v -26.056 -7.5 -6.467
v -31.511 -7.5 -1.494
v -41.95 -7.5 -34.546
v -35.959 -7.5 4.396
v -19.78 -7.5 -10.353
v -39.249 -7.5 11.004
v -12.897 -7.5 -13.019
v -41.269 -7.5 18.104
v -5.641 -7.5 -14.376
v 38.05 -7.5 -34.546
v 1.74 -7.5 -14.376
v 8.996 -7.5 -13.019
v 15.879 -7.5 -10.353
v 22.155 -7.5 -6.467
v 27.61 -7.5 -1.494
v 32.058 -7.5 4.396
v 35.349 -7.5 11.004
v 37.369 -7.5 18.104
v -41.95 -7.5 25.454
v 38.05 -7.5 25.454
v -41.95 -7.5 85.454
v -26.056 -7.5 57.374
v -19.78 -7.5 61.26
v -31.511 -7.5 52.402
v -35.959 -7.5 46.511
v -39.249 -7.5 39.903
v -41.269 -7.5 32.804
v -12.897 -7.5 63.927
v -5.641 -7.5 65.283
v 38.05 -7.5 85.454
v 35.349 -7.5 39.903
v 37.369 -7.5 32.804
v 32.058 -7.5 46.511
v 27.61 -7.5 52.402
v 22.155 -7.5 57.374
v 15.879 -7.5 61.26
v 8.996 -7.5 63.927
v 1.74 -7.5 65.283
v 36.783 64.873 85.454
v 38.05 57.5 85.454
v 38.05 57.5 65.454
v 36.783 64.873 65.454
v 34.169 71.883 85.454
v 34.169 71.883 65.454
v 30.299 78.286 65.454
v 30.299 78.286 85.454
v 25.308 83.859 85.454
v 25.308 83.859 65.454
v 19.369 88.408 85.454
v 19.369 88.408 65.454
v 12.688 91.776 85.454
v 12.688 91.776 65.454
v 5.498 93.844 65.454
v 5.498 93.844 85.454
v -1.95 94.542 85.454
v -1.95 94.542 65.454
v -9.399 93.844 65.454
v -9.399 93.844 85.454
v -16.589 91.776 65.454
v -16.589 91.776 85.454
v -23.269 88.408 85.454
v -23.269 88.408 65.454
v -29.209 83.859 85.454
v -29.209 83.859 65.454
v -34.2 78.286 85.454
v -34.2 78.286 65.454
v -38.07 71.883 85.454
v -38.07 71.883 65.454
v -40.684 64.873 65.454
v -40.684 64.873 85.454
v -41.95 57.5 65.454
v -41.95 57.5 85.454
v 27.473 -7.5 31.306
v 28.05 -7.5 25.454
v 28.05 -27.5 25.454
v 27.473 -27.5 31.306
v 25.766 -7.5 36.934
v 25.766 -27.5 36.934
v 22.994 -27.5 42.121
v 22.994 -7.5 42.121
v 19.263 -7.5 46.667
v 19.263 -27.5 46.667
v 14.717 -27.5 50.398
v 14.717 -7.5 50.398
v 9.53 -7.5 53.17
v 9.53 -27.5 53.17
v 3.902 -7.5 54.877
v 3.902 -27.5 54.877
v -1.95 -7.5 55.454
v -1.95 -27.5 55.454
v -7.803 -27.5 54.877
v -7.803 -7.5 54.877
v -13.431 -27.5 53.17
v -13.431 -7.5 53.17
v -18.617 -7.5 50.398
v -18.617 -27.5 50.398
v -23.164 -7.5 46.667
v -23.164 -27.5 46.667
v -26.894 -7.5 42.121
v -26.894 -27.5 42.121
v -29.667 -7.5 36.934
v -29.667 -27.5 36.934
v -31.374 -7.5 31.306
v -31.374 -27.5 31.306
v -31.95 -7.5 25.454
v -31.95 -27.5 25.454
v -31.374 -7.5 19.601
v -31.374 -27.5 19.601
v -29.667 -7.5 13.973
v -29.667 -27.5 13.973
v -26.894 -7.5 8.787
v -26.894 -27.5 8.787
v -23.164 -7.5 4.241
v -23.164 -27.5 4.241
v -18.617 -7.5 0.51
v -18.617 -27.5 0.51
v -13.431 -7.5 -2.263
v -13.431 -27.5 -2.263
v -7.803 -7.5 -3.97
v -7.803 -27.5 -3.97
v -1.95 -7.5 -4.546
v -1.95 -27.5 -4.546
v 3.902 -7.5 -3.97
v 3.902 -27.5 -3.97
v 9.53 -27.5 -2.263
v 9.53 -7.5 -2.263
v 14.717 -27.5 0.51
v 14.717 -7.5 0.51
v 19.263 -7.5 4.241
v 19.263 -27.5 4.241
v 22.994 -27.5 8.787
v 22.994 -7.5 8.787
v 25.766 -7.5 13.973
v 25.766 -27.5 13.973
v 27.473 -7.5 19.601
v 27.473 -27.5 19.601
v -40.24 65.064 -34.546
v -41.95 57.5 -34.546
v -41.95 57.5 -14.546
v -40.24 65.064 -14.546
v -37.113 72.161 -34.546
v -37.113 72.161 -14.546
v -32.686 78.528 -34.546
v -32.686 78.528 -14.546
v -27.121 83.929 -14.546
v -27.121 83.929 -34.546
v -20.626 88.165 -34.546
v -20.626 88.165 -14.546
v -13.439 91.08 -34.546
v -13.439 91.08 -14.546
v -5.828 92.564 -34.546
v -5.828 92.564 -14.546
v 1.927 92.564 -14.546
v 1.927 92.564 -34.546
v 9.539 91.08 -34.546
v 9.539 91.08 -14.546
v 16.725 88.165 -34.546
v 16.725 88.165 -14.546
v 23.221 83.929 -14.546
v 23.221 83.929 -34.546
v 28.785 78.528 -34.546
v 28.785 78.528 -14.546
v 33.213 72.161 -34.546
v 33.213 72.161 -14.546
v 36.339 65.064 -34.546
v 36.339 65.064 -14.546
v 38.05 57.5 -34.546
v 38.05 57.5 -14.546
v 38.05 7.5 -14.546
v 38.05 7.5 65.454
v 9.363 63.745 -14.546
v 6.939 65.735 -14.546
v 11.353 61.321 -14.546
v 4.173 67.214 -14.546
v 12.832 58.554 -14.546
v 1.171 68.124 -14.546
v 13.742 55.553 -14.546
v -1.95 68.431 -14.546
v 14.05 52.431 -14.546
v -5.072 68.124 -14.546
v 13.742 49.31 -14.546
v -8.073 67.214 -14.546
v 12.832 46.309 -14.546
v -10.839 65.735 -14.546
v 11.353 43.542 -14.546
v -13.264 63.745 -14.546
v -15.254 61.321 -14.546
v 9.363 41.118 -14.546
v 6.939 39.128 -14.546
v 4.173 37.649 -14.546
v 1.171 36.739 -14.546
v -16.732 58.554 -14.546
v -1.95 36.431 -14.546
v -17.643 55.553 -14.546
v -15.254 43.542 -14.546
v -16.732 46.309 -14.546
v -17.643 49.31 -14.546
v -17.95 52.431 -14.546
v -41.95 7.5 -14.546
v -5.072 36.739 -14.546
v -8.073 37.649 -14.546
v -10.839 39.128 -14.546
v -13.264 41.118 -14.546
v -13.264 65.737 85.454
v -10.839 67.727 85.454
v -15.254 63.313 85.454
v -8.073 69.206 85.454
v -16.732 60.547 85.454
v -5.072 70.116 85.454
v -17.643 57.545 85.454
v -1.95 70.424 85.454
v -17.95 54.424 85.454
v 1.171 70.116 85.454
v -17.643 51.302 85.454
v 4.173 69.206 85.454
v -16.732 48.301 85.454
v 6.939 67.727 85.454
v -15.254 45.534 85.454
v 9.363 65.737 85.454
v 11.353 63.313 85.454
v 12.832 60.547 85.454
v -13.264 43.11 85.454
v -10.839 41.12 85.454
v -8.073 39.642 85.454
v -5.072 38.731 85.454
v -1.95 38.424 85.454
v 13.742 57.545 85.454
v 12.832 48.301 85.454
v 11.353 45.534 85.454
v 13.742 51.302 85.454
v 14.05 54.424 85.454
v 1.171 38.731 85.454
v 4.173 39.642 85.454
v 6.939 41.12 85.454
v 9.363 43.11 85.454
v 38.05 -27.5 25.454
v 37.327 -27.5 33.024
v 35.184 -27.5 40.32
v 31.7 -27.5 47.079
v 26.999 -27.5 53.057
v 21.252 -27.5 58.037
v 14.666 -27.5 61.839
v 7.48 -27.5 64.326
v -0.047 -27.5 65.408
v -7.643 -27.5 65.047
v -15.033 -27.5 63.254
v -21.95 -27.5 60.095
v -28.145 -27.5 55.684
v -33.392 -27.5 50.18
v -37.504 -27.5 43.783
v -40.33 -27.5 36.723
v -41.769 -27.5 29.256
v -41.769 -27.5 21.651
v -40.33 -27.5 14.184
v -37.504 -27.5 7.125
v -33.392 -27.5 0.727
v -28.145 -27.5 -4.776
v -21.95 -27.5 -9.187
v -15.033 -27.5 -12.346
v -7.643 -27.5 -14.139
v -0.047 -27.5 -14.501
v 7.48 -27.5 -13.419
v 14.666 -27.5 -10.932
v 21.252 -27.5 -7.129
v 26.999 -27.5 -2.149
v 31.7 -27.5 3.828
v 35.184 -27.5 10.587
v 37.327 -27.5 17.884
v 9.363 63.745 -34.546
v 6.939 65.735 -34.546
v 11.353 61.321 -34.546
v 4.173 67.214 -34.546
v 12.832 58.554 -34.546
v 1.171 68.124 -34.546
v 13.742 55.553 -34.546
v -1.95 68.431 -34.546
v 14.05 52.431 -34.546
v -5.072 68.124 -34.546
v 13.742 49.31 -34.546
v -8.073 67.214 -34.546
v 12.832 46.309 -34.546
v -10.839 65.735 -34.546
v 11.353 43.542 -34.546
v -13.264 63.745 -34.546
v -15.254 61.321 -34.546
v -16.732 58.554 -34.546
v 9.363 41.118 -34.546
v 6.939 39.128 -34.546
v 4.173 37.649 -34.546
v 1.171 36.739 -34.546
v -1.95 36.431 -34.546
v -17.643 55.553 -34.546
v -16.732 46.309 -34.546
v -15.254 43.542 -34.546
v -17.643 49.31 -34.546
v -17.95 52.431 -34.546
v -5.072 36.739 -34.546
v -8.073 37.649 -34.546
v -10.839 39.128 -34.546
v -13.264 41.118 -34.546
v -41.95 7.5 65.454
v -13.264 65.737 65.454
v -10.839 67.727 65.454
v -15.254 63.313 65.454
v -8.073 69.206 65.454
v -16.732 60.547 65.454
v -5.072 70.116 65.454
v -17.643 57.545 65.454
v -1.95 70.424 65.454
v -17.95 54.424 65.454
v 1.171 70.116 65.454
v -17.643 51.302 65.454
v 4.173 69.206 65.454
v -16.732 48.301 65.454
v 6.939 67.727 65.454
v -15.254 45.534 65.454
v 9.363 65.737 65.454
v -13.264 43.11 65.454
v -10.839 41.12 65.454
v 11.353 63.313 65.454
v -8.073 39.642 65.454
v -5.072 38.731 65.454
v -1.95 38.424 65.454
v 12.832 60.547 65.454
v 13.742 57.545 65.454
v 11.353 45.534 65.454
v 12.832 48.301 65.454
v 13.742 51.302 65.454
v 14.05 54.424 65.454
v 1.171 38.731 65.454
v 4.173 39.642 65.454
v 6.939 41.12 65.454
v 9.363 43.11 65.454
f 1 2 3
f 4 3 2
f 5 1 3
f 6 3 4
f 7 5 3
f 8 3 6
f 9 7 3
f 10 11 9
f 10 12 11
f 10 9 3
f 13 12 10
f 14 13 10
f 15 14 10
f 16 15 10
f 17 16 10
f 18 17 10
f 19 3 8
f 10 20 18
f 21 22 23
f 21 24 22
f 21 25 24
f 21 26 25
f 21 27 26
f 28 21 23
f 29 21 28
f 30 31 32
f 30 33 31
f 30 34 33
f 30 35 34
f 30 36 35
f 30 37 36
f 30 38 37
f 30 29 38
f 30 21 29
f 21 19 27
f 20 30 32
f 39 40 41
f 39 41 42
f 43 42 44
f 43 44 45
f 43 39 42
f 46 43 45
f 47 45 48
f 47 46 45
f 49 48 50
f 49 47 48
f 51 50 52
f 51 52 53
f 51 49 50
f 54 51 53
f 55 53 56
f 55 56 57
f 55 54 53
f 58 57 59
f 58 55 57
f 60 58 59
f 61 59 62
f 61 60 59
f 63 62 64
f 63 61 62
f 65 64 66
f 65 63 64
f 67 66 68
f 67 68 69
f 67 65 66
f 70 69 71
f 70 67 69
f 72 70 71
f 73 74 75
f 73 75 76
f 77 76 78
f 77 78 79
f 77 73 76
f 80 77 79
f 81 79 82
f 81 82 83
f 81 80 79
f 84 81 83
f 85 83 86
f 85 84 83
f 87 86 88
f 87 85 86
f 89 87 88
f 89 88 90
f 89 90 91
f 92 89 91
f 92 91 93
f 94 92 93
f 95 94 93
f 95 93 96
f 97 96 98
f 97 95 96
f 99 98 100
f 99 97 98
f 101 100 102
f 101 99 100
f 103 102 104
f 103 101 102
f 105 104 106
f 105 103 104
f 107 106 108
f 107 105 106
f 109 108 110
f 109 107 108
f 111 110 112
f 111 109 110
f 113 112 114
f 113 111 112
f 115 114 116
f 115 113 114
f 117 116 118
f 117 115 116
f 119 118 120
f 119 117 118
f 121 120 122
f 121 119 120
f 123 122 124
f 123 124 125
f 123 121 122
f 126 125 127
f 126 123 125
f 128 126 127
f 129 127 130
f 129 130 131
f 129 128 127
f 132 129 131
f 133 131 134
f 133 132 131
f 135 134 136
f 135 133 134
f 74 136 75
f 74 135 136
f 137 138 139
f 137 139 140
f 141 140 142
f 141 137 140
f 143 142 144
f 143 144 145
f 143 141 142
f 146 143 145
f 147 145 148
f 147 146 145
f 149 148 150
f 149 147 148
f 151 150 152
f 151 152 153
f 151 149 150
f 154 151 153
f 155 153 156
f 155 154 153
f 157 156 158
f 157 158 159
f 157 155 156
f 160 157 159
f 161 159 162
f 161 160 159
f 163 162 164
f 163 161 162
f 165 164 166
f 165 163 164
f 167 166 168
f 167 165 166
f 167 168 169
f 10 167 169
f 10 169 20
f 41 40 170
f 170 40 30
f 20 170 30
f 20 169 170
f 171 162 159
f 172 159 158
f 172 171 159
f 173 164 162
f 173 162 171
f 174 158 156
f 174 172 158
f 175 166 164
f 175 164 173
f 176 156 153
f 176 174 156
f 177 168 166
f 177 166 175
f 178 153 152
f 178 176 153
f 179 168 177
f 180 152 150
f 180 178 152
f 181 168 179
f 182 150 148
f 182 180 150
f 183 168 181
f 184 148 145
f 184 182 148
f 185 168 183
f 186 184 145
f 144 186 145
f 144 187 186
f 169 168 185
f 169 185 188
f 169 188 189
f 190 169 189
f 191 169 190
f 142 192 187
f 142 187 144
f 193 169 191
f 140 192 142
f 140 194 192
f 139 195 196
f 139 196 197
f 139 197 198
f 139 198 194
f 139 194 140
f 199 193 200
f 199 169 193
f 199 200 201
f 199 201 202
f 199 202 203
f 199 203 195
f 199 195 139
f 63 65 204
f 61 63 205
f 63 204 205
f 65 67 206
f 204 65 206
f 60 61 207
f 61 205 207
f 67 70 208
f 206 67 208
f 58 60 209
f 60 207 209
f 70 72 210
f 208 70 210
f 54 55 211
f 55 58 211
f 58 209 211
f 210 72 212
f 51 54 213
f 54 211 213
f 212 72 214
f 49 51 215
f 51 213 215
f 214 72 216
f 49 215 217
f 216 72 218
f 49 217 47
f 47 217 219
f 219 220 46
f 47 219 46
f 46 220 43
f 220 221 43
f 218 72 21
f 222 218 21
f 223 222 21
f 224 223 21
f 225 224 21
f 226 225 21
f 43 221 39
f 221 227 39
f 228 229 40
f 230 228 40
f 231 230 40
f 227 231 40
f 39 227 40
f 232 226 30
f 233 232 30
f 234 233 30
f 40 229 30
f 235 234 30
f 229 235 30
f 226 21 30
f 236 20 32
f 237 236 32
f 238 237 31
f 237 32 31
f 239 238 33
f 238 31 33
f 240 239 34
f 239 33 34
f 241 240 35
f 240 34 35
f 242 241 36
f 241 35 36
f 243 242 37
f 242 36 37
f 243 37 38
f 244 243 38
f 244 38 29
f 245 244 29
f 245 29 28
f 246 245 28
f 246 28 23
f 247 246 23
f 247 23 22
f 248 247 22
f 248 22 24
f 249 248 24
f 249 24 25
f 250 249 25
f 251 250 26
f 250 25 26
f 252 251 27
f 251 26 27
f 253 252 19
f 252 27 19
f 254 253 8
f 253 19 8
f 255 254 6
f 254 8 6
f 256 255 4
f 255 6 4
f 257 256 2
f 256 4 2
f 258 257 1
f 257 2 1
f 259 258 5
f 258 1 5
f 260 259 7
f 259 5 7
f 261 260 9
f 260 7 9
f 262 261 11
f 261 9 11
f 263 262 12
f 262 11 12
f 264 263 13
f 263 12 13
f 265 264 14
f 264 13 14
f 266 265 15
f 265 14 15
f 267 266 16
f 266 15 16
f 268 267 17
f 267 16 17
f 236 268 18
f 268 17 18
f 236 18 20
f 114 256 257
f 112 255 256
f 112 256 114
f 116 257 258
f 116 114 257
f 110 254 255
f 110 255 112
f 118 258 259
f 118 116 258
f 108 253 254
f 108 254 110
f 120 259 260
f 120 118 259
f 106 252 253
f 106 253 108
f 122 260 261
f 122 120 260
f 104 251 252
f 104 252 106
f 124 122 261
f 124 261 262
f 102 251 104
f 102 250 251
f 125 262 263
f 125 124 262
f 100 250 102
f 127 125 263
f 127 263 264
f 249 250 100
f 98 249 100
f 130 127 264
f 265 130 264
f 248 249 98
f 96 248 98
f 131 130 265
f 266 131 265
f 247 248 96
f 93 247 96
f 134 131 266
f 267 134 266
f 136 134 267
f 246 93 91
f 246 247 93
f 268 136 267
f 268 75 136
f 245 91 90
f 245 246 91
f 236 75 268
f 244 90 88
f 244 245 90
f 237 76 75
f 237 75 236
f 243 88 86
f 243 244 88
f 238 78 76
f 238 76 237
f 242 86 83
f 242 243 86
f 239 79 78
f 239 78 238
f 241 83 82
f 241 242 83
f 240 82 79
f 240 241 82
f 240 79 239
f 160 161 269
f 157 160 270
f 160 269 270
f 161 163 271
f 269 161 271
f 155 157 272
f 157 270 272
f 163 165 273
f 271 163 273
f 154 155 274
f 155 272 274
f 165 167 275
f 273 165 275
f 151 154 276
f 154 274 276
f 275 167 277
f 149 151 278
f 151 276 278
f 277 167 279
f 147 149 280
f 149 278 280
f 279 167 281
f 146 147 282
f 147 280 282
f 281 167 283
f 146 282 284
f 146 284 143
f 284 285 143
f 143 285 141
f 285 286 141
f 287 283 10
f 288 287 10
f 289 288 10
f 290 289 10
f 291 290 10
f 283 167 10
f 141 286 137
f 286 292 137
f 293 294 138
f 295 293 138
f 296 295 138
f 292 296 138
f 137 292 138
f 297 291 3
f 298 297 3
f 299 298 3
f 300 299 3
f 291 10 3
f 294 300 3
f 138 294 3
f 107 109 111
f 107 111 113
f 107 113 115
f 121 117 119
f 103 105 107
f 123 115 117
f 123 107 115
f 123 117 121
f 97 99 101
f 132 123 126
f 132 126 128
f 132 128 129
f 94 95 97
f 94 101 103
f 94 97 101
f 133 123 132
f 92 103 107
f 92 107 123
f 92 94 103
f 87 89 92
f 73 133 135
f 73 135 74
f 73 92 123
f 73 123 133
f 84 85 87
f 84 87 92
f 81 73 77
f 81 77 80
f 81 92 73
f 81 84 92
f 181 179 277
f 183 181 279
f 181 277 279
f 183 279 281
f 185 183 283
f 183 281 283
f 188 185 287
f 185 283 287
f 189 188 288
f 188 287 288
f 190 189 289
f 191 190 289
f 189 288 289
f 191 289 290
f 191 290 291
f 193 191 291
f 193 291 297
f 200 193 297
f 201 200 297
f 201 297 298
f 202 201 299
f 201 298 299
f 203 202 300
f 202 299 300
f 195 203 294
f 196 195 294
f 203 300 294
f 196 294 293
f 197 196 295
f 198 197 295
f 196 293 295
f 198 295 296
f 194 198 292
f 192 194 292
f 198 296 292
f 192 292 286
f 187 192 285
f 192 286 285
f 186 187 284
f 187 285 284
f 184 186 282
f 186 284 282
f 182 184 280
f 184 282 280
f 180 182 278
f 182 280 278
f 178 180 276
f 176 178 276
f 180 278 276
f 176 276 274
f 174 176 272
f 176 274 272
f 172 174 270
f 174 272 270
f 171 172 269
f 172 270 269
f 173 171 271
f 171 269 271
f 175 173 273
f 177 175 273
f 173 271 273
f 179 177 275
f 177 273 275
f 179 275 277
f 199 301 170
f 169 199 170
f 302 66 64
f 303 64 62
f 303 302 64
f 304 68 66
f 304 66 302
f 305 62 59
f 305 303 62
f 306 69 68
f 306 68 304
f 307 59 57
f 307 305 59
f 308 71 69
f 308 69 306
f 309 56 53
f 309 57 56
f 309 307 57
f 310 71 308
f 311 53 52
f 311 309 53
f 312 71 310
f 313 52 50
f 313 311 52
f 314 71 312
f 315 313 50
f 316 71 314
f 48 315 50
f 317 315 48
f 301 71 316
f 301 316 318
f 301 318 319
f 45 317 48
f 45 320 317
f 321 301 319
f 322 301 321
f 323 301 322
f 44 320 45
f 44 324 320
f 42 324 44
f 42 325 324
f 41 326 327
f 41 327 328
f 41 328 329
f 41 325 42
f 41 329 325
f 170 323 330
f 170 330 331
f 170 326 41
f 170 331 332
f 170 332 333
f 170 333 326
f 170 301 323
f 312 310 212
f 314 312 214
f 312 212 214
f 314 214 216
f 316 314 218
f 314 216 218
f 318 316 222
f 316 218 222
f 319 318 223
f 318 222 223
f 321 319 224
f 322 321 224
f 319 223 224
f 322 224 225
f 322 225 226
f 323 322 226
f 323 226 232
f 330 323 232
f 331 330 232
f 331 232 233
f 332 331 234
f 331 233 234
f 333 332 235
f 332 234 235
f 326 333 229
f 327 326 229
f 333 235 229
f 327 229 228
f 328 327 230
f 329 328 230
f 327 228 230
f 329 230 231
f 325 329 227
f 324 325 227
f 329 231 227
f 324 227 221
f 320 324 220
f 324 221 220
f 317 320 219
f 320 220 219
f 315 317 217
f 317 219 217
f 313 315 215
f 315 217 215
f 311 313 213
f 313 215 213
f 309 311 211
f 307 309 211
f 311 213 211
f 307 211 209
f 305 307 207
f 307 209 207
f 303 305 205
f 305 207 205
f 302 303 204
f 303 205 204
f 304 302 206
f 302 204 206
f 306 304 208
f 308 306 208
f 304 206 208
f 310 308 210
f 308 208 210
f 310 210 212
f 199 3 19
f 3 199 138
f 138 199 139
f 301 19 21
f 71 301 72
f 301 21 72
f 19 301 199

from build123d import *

# Parameters (mm, degrees)
SKETCH_W      = 80
SKETCH_H      = 120
PAD_DEPTH     = 7.5
SKETCH001_R   = 16
PAD001_DEPTH  = 20
SKETCH002_R   = 16
PAD002_DEPTH  = 20
SKETCH003_R   = 40
SKETCH003_R_2 = 30
PAD003_DEPTH  = 20


with BuildPart() as part:
    # Sketch → Pad (new body, symmetric)
    with BuildSketch(Plane.XZ):
        with Locations((-1.950326, 25.453721)):
            Rectangle(SKETCH_W, SKETCH_H)
    extrude(amount=PAD_DEPTH, both=True)

    # Sketch001 (on Face3 of Pad) → Pad001 (join)
    with BuildSketch(Plane(origin=(0, 0, -34.546279), x_dir=(1, 0, 0), z_dir=(0, 0, -1))):
        with BuildLine():
            Line((-41.950326, -7.5), (38.049674, -7.5))
            Line((38.049674, -7.5), (38.049674, -57.5))
            ThreePointArc((-41.950326, -57.5), (-1.950326, -92.751304), (38.049674, -57.5))
            Line((-41.950326, -7.5), (-41.950326, -57.5))
        make_face()
        with Locations((-1.950326, -52.431456)):
            Circle(SKETCH001_R, mode=Mode.SUBTRACT)
    extrude(amount=-PAD001_DEPTH)

    # Sketch002 (on Face1 of Pad001) → Pad002 (join)
    with BuildSketch(Plane(origin=(0, 0, 85.453721), x_dir=(-1, 0, 0), z_dir=(0, 0, 1))):
        with BuildLine():
            Line((-38.049674, -57.5), (-38.049674, -7.5))
            Line((-38.049674, -7.5), (41.950326, -7.5))
            Line((41.950326, -7.5), (41.950326, -57.5))
            ThreePointArc((-38.049674, -57.5), (1.950326, -94.541734), (41.950326, -57.5))
        make_face()
        with Locations((1.950326, -54.423606)):
            Circle(SKETCH002_R, mode=Mode.SUBTRACT)
    extrude(amount=-PAD002_DEPTH)

    # Sketch003 (on Face5 of Pad002) → Pad003 (join)
    with BuildSketch(Plane.XZ.offset(7.5)):
        with Locations((-1.950326, 25.453721)):
            Circle(SKETCH003_R)
        with Locations((-1.950326, 25.453721)):
            Circle(SKETCH003_R_2, mode=Mode.SUBTRACT)
    extrude(amount=PAD003_DEPTH)


solid = part.part
